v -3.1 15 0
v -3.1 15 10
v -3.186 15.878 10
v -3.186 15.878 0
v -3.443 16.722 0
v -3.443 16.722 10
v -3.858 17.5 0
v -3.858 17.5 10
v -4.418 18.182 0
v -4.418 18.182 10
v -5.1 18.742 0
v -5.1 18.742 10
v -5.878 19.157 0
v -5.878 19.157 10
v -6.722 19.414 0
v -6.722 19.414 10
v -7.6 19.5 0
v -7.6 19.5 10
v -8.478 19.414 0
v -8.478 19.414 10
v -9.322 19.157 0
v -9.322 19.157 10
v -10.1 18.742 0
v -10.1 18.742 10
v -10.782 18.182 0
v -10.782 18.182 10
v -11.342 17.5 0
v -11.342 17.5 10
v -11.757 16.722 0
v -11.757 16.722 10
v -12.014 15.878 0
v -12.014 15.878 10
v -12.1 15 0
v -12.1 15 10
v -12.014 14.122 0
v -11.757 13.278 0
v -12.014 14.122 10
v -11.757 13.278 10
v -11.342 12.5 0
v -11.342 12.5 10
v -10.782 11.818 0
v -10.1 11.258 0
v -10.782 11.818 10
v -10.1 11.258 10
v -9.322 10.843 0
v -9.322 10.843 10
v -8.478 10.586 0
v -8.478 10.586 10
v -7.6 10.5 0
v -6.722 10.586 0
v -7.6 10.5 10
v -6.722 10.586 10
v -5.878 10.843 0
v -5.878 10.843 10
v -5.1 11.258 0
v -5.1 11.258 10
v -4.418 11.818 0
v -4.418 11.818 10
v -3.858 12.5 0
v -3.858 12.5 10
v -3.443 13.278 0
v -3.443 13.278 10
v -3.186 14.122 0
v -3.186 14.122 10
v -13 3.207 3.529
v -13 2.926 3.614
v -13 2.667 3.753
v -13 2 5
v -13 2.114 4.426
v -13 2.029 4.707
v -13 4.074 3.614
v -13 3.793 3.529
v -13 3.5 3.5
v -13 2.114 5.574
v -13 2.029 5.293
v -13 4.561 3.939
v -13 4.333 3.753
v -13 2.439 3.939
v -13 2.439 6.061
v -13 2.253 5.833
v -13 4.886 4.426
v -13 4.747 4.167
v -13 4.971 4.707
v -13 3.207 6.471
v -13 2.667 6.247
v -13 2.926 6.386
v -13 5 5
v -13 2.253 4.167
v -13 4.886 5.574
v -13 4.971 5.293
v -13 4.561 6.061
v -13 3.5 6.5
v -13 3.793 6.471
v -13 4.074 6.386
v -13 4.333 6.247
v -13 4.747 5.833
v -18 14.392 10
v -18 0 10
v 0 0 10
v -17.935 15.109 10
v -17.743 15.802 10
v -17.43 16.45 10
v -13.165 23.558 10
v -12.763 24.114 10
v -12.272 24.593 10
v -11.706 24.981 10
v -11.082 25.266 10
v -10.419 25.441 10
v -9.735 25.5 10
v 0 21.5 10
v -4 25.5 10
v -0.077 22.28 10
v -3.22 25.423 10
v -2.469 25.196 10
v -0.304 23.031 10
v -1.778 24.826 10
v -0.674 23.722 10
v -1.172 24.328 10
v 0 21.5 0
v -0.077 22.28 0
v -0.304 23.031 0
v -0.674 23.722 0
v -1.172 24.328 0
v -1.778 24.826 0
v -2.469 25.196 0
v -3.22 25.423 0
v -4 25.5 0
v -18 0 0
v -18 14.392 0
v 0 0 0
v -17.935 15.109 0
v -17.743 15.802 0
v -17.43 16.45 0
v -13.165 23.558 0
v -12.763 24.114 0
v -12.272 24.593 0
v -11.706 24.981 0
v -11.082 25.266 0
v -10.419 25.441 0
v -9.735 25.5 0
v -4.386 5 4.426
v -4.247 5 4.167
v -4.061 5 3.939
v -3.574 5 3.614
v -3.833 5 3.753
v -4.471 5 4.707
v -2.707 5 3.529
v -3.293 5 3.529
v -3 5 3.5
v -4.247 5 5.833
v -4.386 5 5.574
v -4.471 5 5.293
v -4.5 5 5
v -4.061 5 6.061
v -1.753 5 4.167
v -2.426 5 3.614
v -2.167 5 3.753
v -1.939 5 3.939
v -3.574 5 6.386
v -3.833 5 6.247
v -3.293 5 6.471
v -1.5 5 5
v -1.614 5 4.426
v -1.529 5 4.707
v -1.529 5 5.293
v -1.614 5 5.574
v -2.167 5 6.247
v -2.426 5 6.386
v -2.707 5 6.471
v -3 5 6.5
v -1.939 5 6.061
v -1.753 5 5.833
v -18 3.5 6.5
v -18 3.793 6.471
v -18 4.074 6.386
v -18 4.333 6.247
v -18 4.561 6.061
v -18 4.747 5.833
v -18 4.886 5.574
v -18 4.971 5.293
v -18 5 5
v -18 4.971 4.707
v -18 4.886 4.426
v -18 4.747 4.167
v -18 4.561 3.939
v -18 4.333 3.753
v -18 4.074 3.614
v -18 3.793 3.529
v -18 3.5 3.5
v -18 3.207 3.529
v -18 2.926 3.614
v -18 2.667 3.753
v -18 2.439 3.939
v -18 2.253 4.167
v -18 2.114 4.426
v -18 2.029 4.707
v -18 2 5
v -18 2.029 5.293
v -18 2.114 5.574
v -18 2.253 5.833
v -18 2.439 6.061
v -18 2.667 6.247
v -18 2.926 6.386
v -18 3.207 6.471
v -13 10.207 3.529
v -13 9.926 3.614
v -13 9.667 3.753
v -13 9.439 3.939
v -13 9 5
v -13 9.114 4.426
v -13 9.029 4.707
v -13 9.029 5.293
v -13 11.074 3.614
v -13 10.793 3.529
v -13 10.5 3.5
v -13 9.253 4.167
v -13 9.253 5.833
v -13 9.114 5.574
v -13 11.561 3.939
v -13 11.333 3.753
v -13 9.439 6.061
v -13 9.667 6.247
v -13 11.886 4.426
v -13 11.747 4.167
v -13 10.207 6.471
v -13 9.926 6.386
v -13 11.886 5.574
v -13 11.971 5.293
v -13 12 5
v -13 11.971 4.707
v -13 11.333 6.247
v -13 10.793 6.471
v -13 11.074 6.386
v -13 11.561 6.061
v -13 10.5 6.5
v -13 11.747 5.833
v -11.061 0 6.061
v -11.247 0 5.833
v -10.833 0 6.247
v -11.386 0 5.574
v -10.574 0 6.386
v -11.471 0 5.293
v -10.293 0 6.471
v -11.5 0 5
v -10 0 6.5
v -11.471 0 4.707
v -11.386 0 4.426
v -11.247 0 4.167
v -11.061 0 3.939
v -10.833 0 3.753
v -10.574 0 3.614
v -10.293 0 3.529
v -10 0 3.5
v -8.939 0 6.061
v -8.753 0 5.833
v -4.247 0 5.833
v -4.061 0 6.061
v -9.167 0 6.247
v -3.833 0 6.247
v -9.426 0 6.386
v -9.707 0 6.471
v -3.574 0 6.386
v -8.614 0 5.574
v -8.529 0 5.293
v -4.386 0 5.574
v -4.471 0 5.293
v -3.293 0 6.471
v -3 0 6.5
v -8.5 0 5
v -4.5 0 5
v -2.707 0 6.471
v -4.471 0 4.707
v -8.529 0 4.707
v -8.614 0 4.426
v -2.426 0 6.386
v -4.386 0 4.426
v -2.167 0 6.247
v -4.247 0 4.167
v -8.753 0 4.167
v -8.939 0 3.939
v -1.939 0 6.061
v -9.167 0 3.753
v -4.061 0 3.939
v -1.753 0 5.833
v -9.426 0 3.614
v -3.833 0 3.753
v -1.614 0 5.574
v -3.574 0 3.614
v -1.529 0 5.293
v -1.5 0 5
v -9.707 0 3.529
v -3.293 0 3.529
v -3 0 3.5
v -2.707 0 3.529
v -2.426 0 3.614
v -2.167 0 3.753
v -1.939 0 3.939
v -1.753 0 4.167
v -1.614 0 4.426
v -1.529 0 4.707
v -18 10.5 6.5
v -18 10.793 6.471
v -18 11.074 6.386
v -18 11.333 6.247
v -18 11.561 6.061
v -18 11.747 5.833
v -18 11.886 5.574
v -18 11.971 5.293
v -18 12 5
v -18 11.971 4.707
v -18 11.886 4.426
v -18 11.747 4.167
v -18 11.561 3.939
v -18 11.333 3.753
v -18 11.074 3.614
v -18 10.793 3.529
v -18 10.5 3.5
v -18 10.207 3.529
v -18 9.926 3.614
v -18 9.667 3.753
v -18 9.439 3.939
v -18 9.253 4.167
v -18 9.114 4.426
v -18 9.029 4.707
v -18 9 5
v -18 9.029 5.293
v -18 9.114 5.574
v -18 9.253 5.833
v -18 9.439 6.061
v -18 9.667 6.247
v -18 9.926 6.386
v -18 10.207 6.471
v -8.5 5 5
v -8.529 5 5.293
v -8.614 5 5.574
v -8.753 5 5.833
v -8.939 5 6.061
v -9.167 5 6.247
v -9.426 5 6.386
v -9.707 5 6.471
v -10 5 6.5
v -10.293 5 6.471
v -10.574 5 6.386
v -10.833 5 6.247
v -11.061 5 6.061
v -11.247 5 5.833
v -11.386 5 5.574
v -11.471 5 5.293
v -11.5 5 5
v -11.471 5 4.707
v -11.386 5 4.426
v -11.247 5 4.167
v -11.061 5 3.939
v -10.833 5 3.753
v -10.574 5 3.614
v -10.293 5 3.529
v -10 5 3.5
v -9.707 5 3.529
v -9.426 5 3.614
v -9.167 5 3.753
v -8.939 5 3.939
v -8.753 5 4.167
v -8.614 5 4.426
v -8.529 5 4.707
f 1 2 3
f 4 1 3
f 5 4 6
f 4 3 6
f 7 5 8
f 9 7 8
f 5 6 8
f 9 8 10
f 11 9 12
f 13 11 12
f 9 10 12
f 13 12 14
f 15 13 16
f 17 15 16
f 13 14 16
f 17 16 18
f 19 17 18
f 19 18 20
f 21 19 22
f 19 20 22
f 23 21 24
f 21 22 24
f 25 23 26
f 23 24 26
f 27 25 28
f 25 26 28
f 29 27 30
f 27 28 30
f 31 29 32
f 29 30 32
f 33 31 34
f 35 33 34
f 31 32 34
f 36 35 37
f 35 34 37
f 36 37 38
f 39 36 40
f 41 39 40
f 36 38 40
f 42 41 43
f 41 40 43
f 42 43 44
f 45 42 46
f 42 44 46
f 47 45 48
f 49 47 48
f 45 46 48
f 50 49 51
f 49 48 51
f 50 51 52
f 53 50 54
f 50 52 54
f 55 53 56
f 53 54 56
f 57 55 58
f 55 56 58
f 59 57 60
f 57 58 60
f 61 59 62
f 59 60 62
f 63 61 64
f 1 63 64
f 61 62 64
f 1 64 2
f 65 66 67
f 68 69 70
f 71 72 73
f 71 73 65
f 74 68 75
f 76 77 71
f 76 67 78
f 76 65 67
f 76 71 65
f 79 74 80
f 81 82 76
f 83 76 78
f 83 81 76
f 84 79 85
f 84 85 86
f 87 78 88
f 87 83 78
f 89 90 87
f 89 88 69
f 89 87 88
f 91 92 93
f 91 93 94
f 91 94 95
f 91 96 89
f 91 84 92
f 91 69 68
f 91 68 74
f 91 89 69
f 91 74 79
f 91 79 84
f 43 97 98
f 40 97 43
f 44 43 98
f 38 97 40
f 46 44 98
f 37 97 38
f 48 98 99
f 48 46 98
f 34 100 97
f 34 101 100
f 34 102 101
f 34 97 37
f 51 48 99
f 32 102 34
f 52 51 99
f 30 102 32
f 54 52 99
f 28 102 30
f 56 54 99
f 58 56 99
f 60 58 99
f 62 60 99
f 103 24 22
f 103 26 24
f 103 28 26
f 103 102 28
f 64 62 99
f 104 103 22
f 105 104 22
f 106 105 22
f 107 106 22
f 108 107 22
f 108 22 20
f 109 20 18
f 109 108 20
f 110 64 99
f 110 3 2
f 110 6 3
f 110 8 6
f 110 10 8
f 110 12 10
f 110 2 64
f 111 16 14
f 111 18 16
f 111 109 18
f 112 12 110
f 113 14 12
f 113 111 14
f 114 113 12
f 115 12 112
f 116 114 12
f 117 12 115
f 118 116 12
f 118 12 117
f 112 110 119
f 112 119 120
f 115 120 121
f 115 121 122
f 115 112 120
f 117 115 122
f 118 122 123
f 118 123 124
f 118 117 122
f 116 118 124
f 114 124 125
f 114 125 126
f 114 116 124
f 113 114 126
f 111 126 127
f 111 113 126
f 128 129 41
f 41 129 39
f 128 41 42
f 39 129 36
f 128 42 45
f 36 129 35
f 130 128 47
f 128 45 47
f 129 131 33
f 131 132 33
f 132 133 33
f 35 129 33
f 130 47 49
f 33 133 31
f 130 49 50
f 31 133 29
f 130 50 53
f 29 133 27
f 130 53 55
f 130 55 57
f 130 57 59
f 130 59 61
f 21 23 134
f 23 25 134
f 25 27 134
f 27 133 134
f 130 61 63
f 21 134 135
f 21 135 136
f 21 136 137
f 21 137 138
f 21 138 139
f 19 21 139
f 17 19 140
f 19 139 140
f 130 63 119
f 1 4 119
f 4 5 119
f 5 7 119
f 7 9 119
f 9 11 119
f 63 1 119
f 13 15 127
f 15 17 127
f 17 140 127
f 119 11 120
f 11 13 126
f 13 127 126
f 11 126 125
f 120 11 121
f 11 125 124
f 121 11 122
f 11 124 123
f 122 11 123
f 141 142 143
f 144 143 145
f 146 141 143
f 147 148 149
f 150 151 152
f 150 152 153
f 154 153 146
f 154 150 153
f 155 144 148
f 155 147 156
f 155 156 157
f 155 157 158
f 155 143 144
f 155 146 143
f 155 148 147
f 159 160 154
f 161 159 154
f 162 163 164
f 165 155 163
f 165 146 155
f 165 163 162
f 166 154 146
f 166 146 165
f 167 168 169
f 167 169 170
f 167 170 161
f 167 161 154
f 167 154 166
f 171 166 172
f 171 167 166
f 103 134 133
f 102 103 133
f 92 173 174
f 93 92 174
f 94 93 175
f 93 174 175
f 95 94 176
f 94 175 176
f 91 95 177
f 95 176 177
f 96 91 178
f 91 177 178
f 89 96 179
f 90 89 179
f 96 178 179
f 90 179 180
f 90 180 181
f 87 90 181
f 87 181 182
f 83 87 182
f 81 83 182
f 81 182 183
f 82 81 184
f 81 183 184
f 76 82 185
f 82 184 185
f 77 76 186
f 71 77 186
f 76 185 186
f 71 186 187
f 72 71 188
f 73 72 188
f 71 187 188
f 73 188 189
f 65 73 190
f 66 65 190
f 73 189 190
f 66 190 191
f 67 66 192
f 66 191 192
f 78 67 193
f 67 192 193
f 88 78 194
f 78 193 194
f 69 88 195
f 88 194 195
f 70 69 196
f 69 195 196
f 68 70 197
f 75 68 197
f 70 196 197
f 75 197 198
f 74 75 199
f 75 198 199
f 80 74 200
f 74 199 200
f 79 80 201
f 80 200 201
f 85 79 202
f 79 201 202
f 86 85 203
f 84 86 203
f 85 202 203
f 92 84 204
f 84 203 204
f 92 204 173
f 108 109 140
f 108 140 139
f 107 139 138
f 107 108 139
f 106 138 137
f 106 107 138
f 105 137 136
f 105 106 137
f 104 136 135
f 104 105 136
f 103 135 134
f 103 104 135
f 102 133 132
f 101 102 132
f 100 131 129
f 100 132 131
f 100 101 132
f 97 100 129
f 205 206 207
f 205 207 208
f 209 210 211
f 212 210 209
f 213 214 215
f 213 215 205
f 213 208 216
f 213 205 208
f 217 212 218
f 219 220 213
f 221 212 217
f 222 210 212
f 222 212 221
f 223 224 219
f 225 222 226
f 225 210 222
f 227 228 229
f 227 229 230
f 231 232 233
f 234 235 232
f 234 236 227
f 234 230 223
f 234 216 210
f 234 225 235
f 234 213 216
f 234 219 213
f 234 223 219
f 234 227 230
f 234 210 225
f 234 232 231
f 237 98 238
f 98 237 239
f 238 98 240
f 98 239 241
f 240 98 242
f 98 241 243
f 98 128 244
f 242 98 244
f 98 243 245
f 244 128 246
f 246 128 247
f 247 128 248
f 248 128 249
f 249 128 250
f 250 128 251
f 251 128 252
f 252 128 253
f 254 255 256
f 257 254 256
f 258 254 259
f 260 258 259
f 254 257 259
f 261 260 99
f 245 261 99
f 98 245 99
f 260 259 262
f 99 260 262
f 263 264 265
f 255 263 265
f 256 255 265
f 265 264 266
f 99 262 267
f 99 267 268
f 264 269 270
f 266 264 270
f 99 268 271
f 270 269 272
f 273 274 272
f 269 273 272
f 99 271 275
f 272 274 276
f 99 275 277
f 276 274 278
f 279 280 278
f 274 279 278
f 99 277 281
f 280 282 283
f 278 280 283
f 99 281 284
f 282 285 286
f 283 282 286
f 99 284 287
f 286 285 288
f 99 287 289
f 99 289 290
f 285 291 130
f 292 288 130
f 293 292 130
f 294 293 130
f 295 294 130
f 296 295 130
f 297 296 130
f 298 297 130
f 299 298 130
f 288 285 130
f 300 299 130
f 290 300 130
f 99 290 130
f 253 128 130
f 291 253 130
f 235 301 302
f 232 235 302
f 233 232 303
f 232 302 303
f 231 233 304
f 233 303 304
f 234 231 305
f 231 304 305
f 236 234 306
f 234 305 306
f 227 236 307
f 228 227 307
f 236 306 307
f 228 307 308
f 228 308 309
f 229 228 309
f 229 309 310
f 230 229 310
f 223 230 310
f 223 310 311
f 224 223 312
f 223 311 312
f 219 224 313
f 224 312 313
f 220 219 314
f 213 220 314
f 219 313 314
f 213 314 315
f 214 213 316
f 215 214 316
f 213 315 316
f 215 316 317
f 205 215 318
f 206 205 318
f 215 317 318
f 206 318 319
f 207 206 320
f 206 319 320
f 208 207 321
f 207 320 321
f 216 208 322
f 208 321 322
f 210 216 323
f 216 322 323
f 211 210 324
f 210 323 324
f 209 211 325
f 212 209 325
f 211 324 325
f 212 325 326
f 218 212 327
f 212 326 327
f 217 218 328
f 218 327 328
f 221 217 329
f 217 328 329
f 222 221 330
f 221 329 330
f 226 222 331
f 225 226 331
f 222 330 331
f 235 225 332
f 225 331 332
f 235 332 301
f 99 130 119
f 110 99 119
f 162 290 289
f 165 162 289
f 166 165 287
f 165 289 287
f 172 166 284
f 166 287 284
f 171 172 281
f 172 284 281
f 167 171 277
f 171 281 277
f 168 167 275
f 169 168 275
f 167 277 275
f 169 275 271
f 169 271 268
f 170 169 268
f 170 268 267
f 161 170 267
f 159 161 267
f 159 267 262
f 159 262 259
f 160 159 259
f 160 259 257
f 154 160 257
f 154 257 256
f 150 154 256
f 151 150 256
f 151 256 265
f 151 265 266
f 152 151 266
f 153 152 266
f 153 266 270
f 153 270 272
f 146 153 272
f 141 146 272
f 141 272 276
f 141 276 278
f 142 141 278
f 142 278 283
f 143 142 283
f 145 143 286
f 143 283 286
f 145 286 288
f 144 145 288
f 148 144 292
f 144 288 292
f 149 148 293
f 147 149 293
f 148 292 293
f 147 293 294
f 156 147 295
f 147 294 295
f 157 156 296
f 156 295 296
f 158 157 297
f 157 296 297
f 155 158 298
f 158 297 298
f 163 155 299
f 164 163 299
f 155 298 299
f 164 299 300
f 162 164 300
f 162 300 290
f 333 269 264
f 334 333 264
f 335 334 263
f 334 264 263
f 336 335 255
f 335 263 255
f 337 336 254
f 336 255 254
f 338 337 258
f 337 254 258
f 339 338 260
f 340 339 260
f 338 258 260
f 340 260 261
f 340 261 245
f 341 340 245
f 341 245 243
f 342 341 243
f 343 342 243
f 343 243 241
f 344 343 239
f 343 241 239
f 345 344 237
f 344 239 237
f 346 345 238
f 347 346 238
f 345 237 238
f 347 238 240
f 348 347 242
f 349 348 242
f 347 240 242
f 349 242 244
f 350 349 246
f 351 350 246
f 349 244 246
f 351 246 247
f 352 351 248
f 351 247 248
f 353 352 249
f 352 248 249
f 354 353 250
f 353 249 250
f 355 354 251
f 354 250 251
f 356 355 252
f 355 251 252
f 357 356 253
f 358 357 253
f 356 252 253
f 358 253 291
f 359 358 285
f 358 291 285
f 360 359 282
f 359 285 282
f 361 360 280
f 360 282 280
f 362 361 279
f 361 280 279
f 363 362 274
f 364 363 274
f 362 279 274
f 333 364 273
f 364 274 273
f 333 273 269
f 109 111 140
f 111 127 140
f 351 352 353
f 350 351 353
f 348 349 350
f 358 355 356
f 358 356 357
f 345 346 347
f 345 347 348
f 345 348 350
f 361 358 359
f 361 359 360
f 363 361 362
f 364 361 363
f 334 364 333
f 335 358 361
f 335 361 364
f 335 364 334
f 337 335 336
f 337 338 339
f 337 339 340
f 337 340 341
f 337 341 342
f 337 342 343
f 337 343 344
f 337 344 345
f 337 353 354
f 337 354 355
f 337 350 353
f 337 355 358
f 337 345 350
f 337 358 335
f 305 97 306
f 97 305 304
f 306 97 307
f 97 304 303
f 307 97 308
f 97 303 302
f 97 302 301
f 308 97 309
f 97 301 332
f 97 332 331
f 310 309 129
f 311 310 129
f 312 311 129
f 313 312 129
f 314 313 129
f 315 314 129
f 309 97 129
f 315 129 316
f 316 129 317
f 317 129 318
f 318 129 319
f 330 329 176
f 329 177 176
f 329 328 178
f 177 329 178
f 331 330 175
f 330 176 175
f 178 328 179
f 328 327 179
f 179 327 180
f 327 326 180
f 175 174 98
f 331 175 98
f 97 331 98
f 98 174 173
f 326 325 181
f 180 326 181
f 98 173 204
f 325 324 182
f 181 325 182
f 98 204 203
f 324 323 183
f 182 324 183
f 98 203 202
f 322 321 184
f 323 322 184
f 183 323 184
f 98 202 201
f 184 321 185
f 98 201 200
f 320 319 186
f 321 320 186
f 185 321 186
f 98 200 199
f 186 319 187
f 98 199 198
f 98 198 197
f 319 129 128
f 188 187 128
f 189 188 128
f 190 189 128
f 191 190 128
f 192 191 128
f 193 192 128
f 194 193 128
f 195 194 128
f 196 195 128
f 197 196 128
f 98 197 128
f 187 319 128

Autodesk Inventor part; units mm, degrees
ref_plane "YZ Plane" through (0, 0, 0) normal (1, 0, 0) x (0, 1, 0)
ref_plane "XZ Plane" through (0, 0, 0) normal (0, 1, 0) x (-1, 0, 0)
ref_plane "XY Plane" through (0, 0, 0) normal (0, 0, 1) x (1, 0, 0)
sketch "Esquisse1" plane through (0, 0, 0) normal (0, 0, 1) x (1, 0, 0)
  line L0 (0, 0) -> (0, 25.5)
  line L1 (0, 25.5) -> (-12, 25.5)
  line L2 (-12, 25.5) -> (-18, 15.5)
  line L3 (-18, 15.5) -> (-18, 0)
  line L4 (-18, 0) -> (0, 0)
  dimension "d0" = 18
  dimension "d1" = 25.5
  dimension "d2" = 15.5
  dimension "d3" = 12
extrude "Extrusion1" add sketch "Esquisse1" along normal blind 10
sketch "Esquisse2" plane through (0, 0, 10) normal (0, 0, 1) x (1, 0, 0)
  circle A0 centre (-7.6, 15) radius 4.5
  line L0 (-18, 0) -> (0, 0) projected
  line L1 (0, 0) -> (0, 25.5) projected
  dimension "d6" = 9
  dimension "d7" = 15
  dimension "d8" = 7.6
extrude "Extrusion2" cut sketch "Esquisse2" against normal through all
sketch "Esquisse3" plane through (-18, 0, 0) normal (-1, 0, 0) x (0, 0, 1)
  circle A0 centre (5, 10.5) radius 1.5
  circle A1 centre (5, 3.5) radius 1.5
  line L0 (10, 15.5) -> (10, 0) projected
  line L1 (0, 15.5) -> (0, 0) projected
  line L2 (0, 0) -> (10, 0) projected
  dimension "d11" = 3
  dimension "d12" = 10
  dimension "d13" = 5
  dimension "d14" = 7
  dimension "d15" = 3.5
extrude "Extrusion3" cut sketch "Esquisse3" against normal blind 5
sketch "Esquisse4" plane through (-18, 0, 0) normal (0, -1, 0) x (1, 0, 0)
  circle A0 centre (8, 5) radius 1.5
  circle A1 centre (15, 5) radius 1.5
  line L0 (0, 10) -> (18, 10) projected
  line L1 (0, 0) -> (18, 0) projected
  line L2 (18, 0) -> (18, 10) projected
  dimension "d18" = 10
  dimension "d19" = 5
  dimension "d20" = 7
  dimension "d21" = 3
  dimension "d22" = 3
extrude "Extrusion4" cut sketch "Esquisse4" against normal blind 5
fillet "Congé1" radius 4 3 edges at (-12, 25.5, 5) (0, 25.5, 5) (-18, 15.5, 5)
equation "\"d13\" = 0.5 * d12"
equation "\"d19\" = 0.5 * d18"
properties part number "PilierCentral" material "Plastique ABS"
